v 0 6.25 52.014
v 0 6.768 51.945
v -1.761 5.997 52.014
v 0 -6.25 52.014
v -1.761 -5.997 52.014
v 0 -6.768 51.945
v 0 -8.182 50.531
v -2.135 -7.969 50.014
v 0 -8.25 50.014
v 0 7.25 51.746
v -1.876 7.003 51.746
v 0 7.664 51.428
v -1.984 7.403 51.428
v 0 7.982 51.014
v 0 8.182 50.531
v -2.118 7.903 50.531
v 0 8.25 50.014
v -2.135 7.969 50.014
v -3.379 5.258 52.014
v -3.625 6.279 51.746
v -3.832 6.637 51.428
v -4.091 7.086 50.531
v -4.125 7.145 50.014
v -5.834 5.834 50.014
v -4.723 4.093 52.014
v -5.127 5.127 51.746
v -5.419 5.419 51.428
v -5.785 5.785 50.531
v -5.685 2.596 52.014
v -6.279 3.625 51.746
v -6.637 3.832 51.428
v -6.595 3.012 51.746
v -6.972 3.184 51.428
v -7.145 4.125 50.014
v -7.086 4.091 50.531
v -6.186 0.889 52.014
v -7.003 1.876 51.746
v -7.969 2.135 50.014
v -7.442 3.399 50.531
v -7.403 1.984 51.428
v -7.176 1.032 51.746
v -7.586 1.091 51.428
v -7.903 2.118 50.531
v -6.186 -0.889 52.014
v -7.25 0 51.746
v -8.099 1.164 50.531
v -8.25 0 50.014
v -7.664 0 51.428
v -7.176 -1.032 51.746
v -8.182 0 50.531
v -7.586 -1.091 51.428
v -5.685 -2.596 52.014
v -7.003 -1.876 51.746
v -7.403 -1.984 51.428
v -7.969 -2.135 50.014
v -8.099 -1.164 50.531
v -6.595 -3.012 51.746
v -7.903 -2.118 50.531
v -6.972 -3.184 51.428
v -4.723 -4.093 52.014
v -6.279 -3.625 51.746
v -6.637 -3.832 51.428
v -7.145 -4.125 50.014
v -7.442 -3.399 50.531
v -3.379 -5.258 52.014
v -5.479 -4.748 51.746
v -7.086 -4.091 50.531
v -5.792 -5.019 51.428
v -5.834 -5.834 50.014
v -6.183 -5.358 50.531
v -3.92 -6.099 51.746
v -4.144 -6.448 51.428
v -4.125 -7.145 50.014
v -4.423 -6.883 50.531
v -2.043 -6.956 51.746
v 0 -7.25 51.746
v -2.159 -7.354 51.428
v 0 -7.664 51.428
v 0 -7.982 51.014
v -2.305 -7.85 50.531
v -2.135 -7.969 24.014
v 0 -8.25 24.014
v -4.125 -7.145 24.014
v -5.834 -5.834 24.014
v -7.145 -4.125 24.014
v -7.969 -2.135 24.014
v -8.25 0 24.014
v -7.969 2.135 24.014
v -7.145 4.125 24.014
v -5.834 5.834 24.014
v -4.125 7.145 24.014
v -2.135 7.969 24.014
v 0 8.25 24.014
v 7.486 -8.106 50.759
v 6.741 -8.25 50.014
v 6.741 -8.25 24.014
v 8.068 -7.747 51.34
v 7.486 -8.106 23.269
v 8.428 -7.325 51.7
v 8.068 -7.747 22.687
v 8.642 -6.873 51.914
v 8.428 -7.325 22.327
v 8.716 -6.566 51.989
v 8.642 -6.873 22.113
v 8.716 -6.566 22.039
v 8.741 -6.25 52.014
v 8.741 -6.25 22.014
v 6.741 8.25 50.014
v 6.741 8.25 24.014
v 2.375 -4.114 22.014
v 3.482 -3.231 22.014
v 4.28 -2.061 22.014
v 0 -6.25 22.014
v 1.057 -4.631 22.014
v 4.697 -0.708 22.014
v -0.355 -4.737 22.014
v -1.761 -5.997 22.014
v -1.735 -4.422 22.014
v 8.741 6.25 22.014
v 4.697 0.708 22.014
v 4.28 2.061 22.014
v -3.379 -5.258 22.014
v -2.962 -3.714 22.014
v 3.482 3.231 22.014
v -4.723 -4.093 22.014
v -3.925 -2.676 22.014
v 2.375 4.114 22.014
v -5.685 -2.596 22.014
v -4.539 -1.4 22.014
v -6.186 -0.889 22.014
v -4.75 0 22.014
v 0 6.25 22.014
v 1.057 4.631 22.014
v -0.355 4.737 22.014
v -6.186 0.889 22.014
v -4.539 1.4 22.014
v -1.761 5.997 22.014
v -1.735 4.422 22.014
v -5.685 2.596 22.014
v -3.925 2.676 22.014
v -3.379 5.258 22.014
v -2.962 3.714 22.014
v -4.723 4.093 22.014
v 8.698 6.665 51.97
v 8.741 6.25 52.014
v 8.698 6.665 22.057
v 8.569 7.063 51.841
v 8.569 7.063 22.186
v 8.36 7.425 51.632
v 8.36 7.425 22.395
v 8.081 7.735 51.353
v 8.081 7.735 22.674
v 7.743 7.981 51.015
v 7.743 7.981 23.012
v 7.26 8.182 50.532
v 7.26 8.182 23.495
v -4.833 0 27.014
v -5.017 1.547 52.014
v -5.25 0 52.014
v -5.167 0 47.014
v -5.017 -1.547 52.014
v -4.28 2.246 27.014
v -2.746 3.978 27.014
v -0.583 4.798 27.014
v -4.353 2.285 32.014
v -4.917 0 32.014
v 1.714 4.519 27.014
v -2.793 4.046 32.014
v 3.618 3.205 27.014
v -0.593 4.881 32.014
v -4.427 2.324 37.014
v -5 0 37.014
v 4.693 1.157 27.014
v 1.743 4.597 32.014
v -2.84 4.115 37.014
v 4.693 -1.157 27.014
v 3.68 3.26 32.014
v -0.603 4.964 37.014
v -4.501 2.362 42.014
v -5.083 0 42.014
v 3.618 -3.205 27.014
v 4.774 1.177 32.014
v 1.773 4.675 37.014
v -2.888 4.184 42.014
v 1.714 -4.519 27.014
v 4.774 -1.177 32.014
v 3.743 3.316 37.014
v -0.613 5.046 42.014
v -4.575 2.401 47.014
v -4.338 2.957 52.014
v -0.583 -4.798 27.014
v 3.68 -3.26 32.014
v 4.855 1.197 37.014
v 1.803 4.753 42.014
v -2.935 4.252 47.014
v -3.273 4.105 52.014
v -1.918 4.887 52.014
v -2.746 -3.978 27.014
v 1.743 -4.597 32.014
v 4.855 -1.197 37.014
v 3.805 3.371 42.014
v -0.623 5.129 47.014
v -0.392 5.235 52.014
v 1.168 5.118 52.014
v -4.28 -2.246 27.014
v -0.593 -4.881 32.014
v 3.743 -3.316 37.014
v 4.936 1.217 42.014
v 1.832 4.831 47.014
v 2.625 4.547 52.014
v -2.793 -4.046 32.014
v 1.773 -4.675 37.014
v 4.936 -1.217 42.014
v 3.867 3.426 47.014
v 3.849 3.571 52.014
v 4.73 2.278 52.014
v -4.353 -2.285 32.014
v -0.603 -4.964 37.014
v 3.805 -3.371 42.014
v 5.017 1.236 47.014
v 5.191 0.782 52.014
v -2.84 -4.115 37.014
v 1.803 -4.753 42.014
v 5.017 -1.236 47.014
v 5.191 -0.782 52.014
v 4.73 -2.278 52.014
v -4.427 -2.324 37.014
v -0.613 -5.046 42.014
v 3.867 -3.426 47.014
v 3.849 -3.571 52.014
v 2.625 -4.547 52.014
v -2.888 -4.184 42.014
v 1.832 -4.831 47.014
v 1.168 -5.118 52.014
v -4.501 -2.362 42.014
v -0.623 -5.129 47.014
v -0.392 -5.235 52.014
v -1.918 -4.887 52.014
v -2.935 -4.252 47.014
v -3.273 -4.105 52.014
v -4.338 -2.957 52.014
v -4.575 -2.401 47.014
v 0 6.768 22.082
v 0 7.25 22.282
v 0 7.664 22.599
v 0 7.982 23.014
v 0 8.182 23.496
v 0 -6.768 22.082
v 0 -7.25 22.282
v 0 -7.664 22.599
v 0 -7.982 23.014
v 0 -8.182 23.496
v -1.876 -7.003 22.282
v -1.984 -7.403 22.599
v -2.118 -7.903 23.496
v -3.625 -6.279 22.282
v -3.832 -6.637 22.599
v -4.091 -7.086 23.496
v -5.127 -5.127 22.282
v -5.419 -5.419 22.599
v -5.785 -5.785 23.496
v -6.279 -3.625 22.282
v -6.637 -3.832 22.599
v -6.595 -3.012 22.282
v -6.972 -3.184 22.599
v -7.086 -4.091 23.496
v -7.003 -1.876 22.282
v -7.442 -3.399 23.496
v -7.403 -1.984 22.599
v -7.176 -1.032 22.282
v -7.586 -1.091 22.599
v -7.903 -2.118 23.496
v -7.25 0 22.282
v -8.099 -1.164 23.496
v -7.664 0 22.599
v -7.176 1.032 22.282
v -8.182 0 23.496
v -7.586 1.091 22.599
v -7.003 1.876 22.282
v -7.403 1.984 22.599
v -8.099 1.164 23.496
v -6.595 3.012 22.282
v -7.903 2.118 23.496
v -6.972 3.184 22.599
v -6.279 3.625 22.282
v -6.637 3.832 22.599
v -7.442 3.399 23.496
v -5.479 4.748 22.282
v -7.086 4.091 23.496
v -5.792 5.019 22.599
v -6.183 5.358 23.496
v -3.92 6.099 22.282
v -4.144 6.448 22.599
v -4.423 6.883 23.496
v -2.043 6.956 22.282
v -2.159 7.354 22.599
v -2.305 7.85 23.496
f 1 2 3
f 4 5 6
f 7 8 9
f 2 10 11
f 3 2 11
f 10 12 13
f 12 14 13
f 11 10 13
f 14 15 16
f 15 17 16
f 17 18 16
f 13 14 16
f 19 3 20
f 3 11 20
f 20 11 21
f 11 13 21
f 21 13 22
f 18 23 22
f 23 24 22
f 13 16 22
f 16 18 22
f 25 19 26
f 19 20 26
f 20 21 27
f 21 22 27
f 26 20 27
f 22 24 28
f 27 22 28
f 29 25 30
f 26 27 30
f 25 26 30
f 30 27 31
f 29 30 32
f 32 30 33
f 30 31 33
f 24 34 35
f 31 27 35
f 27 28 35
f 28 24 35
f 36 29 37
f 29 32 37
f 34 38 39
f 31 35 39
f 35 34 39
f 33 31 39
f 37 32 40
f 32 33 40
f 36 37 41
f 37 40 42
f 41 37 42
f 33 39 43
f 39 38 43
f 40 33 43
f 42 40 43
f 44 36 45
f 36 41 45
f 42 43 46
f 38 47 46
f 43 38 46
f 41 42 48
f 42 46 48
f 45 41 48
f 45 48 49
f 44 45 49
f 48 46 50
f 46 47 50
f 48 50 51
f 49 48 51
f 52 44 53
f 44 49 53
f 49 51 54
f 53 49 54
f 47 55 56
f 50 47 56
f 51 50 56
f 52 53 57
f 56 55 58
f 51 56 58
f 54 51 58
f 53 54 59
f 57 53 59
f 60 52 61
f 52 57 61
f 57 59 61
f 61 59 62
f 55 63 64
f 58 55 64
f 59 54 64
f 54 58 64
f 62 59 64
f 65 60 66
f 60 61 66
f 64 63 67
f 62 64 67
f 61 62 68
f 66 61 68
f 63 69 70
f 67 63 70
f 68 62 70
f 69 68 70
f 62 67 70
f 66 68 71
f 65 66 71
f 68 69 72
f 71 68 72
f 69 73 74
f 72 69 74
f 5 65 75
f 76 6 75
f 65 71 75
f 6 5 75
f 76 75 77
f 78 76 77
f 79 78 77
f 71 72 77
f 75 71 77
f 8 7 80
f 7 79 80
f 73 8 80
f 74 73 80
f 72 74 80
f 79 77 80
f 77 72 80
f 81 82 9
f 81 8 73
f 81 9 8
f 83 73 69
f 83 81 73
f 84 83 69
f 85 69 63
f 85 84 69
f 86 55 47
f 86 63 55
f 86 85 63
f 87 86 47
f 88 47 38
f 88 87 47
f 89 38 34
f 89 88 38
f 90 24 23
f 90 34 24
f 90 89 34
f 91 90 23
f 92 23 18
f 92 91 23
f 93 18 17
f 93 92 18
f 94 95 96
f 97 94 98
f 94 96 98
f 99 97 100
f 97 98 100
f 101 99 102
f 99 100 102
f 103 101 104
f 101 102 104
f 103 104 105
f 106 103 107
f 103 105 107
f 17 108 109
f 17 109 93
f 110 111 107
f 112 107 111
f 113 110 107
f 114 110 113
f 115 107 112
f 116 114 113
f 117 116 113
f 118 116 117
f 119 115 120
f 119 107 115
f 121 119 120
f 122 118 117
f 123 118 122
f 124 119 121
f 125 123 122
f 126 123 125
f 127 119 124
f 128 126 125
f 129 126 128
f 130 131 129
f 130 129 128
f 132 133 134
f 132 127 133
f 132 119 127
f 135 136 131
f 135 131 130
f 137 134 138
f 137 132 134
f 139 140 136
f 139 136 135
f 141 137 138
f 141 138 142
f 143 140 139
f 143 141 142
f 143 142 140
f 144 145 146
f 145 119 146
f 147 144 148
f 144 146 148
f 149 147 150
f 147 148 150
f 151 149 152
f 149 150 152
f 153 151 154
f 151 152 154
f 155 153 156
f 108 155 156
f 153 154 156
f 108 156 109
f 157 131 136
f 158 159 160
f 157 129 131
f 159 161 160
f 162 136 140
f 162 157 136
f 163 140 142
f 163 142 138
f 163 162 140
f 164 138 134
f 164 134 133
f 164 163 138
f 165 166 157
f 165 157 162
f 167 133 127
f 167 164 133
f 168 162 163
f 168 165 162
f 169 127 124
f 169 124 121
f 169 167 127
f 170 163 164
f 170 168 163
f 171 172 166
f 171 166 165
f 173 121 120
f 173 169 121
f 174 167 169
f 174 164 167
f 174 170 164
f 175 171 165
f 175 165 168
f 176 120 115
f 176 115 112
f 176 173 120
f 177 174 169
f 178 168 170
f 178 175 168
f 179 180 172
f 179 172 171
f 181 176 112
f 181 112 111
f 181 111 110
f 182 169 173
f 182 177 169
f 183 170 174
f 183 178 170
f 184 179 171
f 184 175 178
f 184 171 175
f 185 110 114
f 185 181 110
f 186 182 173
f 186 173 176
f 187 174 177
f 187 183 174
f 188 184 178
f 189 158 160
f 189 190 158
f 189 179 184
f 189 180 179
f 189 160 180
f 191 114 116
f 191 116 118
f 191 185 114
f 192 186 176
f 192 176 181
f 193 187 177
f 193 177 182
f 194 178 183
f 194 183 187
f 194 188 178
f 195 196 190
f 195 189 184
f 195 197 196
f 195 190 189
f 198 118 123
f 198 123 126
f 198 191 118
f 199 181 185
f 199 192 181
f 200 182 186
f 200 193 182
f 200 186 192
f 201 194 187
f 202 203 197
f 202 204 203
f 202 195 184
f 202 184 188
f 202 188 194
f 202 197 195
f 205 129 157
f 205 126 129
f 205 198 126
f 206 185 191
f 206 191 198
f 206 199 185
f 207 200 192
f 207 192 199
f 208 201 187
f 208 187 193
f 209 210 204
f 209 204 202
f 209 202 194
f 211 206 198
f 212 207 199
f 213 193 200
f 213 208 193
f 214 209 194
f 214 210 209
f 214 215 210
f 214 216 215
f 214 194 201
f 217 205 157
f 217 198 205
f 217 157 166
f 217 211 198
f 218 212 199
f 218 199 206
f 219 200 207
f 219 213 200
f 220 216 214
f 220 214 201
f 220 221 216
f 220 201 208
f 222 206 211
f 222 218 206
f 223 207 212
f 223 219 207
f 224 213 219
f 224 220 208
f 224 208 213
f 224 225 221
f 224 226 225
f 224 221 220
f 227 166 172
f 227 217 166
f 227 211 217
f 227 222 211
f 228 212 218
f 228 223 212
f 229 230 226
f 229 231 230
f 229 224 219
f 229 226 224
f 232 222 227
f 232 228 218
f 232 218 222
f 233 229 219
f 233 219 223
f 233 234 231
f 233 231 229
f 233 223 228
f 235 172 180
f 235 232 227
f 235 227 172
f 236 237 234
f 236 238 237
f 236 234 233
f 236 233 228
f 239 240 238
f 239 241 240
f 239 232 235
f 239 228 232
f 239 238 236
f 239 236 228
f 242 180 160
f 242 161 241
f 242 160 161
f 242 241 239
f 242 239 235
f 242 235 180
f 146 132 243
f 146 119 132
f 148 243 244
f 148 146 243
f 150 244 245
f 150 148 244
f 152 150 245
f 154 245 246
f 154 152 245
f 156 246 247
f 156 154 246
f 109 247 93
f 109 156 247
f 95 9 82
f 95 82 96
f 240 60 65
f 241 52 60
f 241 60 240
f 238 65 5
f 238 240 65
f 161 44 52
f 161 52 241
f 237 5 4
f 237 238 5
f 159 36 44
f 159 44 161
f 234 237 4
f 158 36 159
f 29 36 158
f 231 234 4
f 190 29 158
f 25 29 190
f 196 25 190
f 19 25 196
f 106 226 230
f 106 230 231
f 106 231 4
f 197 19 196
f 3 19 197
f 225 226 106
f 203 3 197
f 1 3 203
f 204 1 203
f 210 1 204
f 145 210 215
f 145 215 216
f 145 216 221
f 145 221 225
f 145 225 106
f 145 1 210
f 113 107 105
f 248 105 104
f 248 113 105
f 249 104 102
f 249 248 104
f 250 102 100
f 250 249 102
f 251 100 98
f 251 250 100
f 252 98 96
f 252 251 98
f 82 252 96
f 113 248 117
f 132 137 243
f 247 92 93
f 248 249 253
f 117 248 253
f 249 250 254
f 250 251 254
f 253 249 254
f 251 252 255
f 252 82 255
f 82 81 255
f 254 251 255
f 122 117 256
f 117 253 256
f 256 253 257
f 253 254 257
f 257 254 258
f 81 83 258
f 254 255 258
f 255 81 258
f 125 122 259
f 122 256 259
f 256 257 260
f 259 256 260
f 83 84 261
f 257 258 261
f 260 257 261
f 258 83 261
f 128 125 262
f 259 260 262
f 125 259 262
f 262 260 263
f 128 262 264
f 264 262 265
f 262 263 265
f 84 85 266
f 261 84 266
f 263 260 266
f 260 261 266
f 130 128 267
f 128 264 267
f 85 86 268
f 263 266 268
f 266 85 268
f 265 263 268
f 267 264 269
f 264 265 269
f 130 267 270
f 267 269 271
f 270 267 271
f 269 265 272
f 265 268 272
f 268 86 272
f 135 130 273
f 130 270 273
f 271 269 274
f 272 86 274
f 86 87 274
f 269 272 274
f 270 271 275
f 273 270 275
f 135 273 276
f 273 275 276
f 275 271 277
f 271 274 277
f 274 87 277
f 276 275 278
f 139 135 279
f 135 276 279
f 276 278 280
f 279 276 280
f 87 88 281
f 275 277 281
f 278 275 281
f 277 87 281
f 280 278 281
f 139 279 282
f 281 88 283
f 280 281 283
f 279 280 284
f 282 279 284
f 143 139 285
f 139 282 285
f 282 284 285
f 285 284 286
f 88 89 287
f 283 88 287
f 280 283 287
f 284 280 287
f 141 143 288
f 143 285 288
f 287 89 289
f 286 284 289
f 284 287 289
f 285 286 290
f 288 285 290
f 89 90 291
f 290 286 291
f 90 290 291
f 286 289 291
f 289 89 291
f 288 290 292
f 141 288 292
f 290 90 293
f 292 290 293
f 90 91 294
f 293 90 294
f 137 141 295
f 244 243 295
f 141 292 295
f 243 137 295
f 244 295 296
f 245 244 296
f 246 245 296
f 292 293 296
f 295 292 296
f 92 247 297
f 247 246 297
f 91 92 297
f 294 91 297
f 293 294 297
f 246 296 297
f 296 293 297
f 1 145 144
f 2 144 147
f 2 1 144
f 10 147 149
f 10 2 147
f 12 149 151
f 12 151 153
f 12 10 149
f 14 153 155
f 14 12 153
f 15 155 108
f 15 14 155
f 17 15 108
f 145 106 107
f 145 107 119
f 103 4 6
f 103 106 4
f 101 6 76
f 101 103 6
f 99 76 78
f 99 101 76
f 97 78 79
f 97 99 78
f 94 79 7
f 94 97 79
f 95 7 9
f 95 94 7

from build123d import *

# Parameters (mm, degrees)
F2_W     = 5.4314797744
F2_H     = 2.6976783276
F2_W_2   = 3.3097509295
F2_H_2   = 11.1936684698
F2_H_3   = 2.6086532027
F3_DEPTH = 30
F4_R     = 2


with BuildPart() as f1:
    # F0 (on Front) → F1 (revolve)
    with BuildSketch(Plane.XZ):
        Polygon((-4.75, 22.0135599375), (-5.25, 52.0135599375), (-8.25, 52.0135599375), (-8.25, 22.0135599375), align=None)
    revolve(axis=Axis((0, 0, 37.0135599375), (0, 0, -1)))

    # F2 (on face) → F3 (join)
    with BuildSketch(Plane.XY.offset(52.0135599375)):
        with Locations((2.7157398872, 6.9011608362)):
            Rectangle(F2_W, F2_H)
        with Locations((7.0863552392, 6.9011608362)):
            Rectangle(F2_W_2, F2_H)
        with Locations((7.0863552392, -0.0445125625)):
            Rectangle(F2_W_2, F2_H_2)
        with Locations((2.7157398872, -6.9456733987)):
            Rectangle(F2_W, F2_H_3)
        with Locations((7.0863552392, -6.9456733987)):
            Rectangle(F2_W_2, F2_H_3)
    extrude(amount=-F3_DEPTH)

    # F4
    f4_edges = [f1.edges().sort_by_distance(p)[0] for p in [
        (8.741231, -8.25, 37.01356),
        (8.741231, 8.25, 37.01356),
        (4.370615, -8.25, 52.01356),
        (-8.25, 0, 22.01356),
    ]]
    fillet(f4_edges, radius=F4_R)


solid = f1.part
